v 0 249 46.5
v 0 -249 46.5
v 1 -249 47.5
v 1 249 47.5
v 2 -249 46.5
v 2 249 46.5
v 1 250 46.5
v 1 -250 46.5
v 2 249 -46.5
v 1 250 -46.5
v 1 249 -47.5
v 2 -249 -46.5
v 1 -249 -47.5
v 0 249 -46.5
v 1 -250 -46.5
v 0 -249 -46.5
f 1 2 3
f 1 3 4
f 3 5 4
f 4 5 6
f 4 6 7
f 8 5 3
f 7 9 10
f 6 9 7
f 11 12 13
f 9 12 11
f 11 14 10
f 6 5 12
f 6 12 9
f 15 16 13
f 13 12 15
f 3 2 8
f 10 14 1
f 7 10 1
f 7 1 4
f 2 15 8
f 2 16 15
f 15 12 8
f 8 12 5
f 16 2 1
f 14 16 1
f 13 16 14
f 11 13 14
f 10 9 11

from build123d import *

# Parameters (mm, degrees)
F0_W     = 500
F0_H     = 95
F1_DEPTH = 2
F2_SIZE  = 0.99999


# Not quite as in the source:
# - a fillet or chamfer is up to 0.001 mm smaller than in the source, because OpenCascade refuses the exact size


with BuildPart() as f1:
    # F0 (on Right) → F1 (new body)
    with BuildSketch(Plane.YZ):
        Rectangle(F0_W, F0_H)
    extrude(amount=F1_DEPTH)

    # F2 (size 1 in the source; OpenCascade refuses exactly that, so slightly less here)
    f2_edges = [f1.edges().sort_by_distance(p)[0] for p in [
        (2, 0, 47.5),
        (2, -250, 0),
        (0, -250, 0),
        (0, 0, 47.5),
        (2, 250, 0),
        (0, 0, -47.5),
        (2, 0, -47.5),
        (0, 250, 0),
        (1, 250, 47.5),
        (1, -250, 47.5),
        (1, -250, -47.5),
        (1, 250, -47.5),
    ]]
    chamfer(f2_edges, length=F2_SIZE)


solid = f1.part
